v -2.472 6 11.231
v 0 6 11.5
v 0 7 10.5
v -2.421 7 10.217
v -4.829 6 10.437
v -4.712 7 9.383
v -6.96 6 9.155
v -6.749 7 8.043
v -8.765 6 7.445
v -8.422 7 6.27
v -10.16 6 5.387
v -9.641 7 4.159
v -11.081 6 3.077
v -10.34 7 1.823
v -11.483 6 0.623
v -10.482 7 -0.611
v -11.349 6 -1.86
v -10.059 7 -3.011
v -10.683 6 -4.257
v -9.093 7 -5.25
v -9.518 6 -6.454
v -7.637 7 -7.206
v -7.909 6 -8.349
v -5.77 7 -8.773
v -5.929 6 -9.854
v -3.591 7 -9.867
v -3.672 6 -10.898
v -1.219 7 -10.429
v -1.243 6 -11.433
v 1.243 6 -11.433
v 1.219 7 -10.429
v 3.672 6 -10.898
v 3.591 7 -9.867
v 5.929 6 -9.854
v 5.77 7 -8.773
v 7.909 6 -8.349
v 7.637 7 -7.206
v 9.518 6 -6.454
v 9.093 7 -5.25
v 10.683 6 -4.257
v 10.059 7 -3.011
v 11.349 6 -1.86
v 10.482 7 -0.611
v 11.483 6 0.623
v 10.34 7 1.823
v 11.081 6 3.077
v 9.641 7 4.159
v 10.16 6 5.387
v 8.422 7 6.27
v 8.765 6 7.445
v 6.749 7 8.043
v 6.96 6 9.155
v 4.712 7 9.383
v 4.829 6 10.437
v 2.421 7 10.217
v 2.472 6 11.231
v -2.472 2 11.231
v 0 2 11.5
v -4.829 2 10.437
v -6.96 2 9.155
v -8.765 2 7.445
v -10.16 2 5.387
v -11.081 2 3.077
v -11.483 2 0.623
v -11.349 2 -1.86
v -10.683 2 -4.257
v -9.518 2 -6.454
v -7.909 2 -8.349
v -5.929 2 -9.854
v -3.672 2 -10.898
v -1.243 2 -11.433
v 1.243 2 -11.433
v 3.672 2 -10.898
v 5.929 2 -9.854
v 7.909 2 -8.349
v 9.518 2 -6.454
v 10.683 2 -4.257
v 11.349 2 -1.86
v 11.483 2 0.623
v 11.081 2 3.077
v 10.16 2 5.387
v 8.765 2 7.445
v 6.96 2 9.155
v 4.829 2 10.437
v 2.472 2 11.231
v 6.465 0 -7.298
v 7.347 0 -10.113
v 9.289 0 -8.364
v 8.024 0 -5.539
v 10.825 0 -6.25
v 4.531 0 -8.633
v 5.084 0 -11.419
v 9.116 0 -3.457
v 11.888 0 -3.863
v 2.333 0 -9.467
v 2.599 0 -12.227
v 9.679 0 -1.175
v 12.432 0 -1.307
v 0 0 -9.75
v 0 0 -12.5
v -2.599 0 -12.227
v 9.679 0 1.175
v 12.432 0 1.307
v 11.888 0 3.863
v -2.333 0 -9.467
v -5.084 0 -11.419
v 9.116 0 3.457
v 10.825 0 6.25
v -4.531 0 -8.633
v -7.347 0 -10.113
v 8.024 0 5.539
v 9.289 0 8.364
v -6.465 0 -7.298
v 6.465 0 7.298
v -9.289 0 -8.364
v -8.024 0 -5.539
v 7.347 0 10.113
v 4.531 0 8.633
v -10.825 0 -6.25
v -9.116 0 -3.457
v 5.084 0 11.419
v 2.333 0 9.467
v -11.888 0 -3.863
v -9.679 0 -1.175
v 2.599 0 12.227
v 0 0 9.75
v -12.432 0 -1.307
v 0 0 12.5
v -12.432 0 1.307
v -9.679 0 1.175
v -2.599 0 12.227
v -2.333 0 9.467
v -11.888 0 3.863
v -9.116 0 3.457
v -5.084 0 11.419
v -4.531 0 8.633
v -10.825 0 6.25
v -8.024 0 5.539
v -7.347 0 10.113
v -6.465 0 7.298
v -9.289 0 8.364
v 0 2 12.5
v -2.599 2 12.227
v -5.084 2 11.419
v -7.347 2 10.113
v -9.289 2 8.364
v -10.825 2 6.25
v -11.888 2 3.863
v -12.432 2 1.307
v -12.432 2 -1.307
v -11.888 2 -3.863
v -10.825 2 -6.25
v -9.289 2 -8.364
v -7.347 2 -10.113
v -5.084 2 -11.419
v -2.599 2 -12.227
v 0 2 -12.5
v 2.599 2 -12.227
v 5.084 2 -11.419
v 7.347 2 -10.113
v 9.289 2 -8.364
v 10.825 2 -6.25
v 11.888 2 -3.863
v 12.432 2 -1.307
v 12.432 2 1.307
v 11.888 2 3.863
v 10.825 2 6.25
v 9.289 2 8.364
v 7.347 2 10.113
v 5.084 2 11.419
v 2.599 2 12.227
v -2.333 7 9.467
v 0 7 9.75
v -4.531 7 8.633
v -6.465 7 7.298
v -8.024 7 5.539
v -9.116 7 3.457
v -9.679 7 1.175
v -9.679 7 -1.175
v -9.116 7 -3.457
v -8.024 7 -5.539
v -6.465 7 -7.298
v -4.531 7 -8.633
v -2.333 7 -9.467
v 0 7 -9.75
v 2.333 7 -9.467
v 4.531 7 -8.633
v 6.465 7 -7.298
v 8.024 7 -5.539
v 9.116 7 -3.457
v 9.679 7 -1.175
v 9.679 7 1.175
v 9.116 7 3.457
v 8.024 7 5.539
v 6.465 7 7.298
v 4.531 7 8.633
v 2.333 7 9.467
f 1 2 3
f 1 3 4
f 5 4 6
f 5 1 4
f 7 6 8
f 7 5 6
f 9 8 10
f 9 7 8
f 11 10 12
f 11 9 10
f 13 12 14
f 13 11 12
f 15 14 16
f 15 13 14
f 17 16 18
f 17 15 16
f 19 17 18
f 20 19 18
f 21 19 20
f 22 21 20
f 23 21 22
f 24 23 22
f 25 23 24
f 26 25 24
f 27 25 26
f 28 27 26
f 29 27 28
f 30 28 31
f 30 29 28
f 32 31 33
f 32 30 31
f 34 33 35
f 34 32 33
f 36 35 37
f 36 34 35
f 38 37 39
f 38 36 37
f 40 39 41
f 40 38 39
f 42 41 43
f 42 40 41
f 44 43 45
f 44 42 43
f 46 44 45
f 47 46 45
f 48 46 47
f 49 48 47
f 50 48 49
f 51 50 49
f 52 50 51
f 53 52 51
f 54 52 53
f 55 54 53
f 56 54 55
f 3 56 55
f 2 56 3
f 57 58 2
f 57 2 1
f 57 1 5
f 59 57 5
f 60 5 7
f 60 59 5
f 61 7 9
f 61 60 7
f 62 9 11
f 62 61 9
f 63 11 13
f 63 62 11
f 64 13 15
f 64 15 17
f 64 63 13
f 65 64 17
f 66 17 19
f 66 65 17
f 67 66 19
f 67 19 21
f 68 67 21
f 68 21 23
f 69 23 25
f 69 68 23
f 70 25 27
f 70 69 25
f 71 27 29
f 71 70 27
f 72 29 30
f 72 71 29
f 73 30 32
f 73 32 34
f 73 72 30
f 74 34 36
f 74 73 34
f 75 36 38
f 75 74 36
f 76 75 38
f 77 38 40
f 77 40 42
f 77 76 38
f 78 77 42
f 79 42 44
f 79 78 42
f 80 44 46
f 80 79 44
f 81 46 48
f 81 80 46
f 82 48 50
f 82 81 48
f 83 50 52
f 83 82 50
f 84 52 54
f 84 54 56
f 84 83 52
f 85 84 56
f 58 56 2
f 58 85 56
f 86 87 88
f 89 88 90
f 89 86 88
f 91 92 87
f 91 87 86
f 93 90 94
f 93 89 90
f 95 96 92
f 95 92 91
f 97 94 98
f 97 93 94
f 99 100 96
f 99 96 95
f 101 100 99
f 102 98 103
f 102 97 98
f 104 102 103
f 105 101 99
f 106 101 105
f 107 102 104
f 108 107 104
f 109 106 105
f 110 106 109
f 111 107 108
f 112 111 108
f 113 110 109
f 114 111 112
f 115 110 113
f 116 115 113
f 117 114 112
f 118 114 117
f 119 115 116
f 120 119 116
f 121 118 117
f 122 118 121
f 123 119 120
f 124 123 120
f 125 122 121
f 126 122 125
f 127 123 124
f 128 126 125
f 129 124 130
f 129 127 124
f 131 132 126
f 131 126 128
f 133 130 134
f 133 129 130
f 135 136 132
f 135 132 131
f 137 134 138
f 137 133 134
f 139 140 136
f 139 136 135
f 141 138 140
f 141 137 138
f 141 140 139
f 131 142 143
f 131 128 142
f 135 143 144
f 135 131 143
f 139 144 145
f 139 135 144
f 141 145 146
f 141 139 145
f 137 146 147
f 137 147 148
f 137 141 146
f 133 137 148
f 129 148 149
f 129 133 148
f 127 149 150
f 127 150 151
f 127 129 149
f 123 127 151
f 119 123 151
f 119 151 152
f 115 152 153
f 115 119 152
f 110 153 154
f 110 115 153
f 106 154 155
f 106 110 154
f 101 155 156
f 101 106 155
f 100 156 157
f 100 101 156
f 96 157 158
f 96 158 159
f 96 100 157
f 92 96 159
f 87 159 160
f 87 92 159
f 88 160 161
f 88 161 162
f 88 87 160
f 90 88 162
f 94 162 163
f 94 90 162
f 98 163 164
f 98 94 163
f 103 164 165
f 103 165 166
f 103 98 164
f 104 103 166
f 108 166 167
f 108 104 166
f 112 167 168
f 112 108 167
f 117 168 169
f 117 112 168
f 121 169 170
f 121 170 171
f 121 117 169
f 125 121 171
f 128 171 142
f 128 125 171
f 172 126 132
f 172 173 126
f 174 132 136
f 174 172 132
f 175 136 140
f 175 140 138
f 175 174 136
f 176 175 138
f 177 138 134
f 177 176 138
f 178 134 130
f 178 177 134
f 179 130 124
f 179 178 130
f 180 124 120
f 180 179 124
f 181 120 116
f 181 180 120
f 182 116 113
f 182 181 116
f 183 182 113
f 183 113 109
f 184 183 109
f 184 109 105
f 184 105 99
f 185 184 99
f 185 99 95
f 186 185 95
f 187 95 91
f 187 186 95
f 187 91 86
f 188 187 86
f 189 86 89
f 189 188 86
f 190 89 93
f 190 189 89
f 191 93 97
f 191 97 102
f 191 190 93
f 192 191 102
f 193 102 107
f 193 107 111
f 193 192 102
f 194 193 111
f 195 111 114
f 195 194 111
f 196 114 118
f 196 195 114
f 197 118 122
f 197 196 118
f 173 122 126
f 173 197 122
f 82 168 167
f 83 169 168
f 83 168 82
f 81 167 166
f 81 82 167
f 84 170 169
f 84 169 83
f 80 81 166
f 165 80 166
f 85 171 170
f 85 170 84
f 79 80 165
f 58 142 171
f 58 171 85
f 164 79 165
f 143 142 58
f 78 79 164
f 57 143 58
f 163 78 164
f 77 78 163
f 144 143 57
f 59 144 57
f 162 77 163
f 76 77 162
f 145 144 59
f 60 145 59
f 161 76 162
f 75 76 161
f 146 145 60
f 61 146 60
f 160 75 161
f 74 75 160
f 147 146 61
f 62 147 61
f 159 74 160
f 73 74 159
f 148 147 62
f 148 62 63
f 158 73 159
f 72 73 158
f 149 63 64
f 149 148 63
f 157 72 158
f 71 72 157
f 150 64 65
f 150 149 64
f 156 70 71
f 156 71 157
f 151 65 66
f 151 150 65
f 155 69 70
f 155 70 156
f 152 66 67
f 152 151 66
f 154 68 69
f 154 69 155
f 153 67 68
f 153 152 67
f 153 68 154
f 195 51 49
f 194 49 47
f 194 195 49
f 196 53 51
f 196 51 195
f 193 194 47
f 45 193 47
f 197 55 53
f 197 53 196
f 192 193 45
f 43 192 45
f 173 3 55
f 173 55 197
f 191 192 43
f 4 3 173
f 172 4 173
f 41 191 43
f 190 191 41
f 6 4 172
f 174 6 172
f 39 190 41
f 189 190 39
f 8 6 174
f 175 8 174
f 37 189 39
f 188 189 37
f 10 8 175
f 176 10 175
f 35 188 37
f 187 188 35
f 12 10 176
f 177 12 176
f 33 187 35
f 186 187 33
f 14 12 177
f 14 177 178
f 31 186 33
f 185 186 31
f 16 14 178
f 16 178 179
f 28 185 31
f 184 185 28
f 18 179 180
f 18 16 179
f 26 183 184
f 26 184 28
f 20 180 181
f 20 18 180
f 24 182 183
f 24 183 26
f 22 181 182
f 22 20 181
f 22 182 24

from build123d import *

# Parameters (mm, degrees)
F2_SIZE = 1


with BuildPart() as f1:
    # F0 (on Right) → F1 (revolve)
    with BuildSketch(Plane.YZ):
        Polygon((0, 9.75), (7, 9.75), (7, 11.5), (2, 11.5), (2, 12.5), (0, 12.5), align=None)
    revolve(axis=Axis((0, 5.735075, 0), (0, -1, 0)))

    # F2
    f2_edges = [f1.edges().sort_by_distance(p)[0] for p in [
        (0, 7, -11.5),
    ]]
    chamfer(f2_edges, length=F2_SIZE)


solid = f1.part
